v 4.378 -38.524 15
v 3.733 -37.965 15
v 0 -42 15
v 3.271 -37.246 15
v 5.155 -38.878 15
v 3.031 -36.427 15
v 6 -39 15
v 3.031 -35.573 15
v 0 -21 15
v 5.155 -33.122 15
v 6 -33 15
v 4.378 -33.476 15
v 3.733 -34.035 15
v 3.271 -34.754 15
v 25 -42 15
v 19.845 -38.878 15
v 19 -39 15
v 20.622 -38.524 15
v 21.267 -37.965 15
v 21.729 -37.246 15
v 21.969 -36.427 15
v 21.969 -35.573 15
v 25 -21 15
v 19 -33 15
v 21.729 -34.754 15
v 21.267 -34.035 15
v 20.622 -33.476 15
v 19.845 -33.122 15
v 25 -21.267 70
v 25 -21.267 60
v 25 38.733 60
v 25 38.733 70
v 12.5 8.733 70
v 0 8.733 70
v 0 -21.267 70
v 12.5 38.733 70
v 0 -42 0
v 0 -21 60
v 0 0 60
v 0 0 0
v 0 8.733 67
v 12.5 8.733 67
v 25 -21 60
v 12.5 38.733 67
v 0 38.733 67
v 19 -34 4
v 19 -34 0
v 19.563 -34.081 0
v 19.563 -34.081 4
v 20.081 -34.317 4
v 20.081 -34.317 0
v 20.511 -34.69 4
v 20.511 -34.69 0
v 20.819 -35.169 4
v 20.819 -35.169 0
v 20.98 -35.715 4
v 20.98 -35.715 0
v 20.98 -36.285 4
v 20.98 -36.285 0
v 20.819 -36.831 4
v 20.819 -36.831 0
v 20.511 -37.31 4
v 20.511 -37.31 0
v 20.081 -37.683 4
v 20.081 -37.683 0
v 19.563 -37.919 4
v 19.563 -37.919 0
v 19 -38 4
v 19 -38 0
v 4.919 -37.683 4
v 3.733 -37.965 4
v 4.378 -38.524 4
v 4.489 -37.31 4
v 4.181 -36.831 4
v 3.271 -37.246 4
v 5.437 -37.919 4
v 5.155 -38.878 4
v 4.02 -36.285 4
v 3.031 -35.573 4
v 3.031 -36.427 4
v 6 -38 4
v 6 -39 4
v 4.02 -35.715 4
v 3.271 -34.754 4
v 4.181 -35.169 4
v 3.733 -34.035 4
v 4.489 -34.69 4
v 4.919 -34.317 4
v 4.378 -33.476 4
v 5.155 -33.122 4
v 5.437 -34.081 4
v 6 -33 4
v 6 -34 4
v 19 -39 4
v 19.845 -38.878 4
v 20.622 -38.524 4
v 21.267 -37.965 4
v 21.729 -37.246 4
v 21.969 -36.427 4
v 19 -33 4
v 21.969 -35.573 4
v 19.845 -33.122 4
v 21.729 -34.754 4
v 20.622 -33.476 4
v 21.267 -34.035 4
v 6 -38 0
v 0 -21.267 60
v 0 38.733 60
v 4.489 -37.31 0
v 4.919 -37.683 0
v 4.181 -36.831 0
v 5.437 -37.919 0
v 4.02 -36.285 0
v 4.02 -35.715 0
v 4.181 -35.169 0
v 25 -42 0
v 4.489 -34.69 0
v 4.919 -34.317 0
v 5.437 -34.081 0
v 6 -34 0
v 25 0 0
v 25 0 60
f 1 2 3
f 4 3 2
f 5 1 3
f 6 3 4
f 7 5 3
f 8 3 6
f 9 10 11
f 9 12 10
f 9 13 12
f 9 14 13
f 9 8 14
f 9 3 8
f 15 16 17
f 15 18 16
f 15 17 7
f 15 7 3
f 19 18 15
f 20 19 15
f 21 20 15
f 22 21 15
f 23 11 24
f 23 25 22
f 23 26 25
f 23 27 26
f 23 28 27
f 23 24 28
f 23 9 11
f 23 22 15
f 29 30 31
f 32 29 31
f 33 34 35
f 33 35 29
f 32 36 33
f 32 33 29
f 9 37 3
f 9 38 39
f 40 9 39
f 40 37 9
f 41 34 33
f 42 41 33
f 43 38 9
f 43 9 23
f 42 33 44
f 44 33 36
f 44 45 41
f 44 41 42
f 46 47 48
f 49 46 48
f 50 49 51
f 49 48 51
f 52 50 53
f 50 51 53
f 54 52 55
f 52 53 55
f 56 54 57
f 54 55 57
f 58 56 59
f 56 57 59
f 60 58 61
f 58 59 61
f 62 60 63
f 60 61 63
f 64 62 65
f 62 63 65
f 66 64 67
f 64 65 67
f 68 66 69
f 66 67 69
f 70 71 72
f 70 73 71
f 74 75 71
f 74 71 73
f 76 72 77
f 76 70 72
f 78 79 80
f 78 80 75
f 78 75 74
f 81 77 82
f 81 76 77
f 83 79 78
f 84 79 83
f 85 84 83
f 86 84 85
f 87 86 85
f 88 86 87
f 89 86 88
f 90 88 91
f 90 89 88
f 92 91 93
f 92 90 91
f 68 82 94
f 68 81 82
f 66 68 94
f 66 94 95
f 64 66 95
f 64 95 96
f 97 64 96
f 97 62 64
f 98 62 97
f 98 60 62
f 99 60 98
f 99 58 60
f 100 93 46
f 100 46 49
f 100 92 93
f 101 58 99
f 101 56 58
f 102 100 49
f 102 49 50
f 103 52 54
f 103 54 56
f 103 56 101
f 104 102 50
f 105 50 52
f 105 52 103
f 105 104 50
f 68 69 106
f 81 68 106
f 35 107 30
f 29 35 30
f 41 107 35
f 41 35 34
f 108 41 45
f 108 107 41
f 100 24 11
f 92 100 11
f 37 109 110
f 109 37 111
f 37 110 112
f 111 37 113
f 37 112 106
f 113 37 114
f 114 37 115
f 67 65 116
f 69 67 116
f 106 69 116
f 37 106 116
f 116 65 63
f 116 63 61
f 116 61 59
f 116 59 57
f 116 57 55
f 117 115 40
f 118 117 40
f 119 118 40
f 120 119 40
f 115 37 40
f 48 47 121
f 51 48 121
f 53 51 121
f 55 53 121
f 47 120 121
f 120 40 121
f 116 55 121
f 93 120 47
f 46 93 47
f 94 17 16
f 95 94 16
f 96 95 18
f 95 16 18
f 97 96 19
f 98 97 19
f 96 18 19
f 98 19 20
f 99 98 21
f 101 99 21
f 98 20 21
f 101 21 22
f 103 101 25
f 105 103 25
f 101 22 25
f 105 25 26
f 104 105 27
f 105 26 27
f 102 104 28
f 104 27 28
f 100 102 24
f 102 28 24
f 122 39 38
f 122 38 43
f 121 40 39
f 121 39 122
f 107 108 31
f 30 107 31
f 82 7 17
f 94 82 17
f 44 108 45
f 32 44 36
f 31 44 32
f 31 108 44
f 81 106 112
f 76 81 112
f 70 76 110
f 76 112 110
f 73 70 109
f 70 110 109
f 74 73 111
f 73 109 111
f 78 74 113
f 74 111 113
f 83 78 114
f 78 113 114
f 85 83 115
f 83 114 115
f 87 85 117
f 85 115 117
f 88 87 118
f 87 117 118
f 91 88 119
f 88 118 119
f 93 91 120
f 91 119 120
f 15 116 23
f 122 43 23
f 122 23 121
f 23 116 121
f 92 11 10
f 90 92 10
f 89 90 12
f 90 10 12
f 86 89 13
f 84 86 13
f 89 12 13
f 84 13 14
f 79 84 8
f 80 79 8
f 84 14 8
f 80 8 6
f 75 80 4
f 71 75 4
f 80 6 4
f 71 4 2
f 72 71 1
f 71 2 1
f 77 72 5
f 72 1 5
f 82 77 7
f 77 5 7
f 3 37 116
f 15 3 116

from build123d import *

# Parameters (mm, degrees)
F0_W      = 25
F0_H      = 42
F1_DEPTH  = 60
F2_W      = 25
F2_H      = 21
F3_DEPTH  = 45
F5_DEPTH  = 35
F7_DEPTH  = 11
F9_W      = 25
F9_H      = 60
F10_DEPTH = 10
F11_W     = 12.5
F11_H     = 30
F12_DEPTH = 3


with BuildPart() as f1:
    # F0 (on Top) → F1 (new body)
    with BuildSketch(Plane.XY):
        with Locations((12.5, -21)):
            Rectangle(F0_W, F0_H)
    extrude(amount=F1_DEPTH)

    # F2 (on face) → F3 (cut)
    with BuildSketch(Plane.XY.offset(60)):
        with Locations((12.5, -31.5)):
            Rectangle(F2_W, F2_H)
    extrude(amount=-F3_DEPTH, mode=Mode.SUBTRACT)

    # F4 (on face) → F5 (cut)
    with BuildSketch(Plane(origin=(0, 0, 0), x_dir=(1, 0, 0), z_dir=(0, 0, -1))):
        with BuildLine():
            Line((19, 38), (6, 38))
            ThreePointArc((6, 38), (4, 36), (6, 34))
            Line((6, 34), (19, 34))
            ThreePointArc((19, 34), (21, 36), (19, 38))
        make_face()
    extrude(amount=-F5_DEPTH, mode=Mode.SUBTRACT)

    # F6 (on face) → F7 (cut)
    with BuildSketch(Plane.XY.offset(15)):
        with BuildLine():
            ThreePointArc((6, -33), (3, -36), (6, -39))
            Line((6, -39), (19, -39))
            ThreePointArc((19, -39), (22, -36), (19, -33))
            Line((19, -33), (6, -33))
        make_face()
    extrude(amount=-F7_DEPTH, mode=Mode.SUBTRACT)


with BuildPart() as f10:
    # F9 (on offset) → F10 (new body)
    with BuildSketch(Plane.XY.offset(60)):
        with Locations((12.5, 8.733432)):
            Rectangle(F9_W, F9_H)
    extrude(amount=F10_DEPTH)

    # F11 (on face) → F12 (cut)
    with BuildSketch(Plane.XY.offset(70)):
        with Locations((6.25, 23.733432)):
            Rectangle(F11_W, F11_H)
    extrude(amount=-F12_DEPTH, mode=Mode.SUBTRACT)


solid = Compound([f1.part, f10.part])
